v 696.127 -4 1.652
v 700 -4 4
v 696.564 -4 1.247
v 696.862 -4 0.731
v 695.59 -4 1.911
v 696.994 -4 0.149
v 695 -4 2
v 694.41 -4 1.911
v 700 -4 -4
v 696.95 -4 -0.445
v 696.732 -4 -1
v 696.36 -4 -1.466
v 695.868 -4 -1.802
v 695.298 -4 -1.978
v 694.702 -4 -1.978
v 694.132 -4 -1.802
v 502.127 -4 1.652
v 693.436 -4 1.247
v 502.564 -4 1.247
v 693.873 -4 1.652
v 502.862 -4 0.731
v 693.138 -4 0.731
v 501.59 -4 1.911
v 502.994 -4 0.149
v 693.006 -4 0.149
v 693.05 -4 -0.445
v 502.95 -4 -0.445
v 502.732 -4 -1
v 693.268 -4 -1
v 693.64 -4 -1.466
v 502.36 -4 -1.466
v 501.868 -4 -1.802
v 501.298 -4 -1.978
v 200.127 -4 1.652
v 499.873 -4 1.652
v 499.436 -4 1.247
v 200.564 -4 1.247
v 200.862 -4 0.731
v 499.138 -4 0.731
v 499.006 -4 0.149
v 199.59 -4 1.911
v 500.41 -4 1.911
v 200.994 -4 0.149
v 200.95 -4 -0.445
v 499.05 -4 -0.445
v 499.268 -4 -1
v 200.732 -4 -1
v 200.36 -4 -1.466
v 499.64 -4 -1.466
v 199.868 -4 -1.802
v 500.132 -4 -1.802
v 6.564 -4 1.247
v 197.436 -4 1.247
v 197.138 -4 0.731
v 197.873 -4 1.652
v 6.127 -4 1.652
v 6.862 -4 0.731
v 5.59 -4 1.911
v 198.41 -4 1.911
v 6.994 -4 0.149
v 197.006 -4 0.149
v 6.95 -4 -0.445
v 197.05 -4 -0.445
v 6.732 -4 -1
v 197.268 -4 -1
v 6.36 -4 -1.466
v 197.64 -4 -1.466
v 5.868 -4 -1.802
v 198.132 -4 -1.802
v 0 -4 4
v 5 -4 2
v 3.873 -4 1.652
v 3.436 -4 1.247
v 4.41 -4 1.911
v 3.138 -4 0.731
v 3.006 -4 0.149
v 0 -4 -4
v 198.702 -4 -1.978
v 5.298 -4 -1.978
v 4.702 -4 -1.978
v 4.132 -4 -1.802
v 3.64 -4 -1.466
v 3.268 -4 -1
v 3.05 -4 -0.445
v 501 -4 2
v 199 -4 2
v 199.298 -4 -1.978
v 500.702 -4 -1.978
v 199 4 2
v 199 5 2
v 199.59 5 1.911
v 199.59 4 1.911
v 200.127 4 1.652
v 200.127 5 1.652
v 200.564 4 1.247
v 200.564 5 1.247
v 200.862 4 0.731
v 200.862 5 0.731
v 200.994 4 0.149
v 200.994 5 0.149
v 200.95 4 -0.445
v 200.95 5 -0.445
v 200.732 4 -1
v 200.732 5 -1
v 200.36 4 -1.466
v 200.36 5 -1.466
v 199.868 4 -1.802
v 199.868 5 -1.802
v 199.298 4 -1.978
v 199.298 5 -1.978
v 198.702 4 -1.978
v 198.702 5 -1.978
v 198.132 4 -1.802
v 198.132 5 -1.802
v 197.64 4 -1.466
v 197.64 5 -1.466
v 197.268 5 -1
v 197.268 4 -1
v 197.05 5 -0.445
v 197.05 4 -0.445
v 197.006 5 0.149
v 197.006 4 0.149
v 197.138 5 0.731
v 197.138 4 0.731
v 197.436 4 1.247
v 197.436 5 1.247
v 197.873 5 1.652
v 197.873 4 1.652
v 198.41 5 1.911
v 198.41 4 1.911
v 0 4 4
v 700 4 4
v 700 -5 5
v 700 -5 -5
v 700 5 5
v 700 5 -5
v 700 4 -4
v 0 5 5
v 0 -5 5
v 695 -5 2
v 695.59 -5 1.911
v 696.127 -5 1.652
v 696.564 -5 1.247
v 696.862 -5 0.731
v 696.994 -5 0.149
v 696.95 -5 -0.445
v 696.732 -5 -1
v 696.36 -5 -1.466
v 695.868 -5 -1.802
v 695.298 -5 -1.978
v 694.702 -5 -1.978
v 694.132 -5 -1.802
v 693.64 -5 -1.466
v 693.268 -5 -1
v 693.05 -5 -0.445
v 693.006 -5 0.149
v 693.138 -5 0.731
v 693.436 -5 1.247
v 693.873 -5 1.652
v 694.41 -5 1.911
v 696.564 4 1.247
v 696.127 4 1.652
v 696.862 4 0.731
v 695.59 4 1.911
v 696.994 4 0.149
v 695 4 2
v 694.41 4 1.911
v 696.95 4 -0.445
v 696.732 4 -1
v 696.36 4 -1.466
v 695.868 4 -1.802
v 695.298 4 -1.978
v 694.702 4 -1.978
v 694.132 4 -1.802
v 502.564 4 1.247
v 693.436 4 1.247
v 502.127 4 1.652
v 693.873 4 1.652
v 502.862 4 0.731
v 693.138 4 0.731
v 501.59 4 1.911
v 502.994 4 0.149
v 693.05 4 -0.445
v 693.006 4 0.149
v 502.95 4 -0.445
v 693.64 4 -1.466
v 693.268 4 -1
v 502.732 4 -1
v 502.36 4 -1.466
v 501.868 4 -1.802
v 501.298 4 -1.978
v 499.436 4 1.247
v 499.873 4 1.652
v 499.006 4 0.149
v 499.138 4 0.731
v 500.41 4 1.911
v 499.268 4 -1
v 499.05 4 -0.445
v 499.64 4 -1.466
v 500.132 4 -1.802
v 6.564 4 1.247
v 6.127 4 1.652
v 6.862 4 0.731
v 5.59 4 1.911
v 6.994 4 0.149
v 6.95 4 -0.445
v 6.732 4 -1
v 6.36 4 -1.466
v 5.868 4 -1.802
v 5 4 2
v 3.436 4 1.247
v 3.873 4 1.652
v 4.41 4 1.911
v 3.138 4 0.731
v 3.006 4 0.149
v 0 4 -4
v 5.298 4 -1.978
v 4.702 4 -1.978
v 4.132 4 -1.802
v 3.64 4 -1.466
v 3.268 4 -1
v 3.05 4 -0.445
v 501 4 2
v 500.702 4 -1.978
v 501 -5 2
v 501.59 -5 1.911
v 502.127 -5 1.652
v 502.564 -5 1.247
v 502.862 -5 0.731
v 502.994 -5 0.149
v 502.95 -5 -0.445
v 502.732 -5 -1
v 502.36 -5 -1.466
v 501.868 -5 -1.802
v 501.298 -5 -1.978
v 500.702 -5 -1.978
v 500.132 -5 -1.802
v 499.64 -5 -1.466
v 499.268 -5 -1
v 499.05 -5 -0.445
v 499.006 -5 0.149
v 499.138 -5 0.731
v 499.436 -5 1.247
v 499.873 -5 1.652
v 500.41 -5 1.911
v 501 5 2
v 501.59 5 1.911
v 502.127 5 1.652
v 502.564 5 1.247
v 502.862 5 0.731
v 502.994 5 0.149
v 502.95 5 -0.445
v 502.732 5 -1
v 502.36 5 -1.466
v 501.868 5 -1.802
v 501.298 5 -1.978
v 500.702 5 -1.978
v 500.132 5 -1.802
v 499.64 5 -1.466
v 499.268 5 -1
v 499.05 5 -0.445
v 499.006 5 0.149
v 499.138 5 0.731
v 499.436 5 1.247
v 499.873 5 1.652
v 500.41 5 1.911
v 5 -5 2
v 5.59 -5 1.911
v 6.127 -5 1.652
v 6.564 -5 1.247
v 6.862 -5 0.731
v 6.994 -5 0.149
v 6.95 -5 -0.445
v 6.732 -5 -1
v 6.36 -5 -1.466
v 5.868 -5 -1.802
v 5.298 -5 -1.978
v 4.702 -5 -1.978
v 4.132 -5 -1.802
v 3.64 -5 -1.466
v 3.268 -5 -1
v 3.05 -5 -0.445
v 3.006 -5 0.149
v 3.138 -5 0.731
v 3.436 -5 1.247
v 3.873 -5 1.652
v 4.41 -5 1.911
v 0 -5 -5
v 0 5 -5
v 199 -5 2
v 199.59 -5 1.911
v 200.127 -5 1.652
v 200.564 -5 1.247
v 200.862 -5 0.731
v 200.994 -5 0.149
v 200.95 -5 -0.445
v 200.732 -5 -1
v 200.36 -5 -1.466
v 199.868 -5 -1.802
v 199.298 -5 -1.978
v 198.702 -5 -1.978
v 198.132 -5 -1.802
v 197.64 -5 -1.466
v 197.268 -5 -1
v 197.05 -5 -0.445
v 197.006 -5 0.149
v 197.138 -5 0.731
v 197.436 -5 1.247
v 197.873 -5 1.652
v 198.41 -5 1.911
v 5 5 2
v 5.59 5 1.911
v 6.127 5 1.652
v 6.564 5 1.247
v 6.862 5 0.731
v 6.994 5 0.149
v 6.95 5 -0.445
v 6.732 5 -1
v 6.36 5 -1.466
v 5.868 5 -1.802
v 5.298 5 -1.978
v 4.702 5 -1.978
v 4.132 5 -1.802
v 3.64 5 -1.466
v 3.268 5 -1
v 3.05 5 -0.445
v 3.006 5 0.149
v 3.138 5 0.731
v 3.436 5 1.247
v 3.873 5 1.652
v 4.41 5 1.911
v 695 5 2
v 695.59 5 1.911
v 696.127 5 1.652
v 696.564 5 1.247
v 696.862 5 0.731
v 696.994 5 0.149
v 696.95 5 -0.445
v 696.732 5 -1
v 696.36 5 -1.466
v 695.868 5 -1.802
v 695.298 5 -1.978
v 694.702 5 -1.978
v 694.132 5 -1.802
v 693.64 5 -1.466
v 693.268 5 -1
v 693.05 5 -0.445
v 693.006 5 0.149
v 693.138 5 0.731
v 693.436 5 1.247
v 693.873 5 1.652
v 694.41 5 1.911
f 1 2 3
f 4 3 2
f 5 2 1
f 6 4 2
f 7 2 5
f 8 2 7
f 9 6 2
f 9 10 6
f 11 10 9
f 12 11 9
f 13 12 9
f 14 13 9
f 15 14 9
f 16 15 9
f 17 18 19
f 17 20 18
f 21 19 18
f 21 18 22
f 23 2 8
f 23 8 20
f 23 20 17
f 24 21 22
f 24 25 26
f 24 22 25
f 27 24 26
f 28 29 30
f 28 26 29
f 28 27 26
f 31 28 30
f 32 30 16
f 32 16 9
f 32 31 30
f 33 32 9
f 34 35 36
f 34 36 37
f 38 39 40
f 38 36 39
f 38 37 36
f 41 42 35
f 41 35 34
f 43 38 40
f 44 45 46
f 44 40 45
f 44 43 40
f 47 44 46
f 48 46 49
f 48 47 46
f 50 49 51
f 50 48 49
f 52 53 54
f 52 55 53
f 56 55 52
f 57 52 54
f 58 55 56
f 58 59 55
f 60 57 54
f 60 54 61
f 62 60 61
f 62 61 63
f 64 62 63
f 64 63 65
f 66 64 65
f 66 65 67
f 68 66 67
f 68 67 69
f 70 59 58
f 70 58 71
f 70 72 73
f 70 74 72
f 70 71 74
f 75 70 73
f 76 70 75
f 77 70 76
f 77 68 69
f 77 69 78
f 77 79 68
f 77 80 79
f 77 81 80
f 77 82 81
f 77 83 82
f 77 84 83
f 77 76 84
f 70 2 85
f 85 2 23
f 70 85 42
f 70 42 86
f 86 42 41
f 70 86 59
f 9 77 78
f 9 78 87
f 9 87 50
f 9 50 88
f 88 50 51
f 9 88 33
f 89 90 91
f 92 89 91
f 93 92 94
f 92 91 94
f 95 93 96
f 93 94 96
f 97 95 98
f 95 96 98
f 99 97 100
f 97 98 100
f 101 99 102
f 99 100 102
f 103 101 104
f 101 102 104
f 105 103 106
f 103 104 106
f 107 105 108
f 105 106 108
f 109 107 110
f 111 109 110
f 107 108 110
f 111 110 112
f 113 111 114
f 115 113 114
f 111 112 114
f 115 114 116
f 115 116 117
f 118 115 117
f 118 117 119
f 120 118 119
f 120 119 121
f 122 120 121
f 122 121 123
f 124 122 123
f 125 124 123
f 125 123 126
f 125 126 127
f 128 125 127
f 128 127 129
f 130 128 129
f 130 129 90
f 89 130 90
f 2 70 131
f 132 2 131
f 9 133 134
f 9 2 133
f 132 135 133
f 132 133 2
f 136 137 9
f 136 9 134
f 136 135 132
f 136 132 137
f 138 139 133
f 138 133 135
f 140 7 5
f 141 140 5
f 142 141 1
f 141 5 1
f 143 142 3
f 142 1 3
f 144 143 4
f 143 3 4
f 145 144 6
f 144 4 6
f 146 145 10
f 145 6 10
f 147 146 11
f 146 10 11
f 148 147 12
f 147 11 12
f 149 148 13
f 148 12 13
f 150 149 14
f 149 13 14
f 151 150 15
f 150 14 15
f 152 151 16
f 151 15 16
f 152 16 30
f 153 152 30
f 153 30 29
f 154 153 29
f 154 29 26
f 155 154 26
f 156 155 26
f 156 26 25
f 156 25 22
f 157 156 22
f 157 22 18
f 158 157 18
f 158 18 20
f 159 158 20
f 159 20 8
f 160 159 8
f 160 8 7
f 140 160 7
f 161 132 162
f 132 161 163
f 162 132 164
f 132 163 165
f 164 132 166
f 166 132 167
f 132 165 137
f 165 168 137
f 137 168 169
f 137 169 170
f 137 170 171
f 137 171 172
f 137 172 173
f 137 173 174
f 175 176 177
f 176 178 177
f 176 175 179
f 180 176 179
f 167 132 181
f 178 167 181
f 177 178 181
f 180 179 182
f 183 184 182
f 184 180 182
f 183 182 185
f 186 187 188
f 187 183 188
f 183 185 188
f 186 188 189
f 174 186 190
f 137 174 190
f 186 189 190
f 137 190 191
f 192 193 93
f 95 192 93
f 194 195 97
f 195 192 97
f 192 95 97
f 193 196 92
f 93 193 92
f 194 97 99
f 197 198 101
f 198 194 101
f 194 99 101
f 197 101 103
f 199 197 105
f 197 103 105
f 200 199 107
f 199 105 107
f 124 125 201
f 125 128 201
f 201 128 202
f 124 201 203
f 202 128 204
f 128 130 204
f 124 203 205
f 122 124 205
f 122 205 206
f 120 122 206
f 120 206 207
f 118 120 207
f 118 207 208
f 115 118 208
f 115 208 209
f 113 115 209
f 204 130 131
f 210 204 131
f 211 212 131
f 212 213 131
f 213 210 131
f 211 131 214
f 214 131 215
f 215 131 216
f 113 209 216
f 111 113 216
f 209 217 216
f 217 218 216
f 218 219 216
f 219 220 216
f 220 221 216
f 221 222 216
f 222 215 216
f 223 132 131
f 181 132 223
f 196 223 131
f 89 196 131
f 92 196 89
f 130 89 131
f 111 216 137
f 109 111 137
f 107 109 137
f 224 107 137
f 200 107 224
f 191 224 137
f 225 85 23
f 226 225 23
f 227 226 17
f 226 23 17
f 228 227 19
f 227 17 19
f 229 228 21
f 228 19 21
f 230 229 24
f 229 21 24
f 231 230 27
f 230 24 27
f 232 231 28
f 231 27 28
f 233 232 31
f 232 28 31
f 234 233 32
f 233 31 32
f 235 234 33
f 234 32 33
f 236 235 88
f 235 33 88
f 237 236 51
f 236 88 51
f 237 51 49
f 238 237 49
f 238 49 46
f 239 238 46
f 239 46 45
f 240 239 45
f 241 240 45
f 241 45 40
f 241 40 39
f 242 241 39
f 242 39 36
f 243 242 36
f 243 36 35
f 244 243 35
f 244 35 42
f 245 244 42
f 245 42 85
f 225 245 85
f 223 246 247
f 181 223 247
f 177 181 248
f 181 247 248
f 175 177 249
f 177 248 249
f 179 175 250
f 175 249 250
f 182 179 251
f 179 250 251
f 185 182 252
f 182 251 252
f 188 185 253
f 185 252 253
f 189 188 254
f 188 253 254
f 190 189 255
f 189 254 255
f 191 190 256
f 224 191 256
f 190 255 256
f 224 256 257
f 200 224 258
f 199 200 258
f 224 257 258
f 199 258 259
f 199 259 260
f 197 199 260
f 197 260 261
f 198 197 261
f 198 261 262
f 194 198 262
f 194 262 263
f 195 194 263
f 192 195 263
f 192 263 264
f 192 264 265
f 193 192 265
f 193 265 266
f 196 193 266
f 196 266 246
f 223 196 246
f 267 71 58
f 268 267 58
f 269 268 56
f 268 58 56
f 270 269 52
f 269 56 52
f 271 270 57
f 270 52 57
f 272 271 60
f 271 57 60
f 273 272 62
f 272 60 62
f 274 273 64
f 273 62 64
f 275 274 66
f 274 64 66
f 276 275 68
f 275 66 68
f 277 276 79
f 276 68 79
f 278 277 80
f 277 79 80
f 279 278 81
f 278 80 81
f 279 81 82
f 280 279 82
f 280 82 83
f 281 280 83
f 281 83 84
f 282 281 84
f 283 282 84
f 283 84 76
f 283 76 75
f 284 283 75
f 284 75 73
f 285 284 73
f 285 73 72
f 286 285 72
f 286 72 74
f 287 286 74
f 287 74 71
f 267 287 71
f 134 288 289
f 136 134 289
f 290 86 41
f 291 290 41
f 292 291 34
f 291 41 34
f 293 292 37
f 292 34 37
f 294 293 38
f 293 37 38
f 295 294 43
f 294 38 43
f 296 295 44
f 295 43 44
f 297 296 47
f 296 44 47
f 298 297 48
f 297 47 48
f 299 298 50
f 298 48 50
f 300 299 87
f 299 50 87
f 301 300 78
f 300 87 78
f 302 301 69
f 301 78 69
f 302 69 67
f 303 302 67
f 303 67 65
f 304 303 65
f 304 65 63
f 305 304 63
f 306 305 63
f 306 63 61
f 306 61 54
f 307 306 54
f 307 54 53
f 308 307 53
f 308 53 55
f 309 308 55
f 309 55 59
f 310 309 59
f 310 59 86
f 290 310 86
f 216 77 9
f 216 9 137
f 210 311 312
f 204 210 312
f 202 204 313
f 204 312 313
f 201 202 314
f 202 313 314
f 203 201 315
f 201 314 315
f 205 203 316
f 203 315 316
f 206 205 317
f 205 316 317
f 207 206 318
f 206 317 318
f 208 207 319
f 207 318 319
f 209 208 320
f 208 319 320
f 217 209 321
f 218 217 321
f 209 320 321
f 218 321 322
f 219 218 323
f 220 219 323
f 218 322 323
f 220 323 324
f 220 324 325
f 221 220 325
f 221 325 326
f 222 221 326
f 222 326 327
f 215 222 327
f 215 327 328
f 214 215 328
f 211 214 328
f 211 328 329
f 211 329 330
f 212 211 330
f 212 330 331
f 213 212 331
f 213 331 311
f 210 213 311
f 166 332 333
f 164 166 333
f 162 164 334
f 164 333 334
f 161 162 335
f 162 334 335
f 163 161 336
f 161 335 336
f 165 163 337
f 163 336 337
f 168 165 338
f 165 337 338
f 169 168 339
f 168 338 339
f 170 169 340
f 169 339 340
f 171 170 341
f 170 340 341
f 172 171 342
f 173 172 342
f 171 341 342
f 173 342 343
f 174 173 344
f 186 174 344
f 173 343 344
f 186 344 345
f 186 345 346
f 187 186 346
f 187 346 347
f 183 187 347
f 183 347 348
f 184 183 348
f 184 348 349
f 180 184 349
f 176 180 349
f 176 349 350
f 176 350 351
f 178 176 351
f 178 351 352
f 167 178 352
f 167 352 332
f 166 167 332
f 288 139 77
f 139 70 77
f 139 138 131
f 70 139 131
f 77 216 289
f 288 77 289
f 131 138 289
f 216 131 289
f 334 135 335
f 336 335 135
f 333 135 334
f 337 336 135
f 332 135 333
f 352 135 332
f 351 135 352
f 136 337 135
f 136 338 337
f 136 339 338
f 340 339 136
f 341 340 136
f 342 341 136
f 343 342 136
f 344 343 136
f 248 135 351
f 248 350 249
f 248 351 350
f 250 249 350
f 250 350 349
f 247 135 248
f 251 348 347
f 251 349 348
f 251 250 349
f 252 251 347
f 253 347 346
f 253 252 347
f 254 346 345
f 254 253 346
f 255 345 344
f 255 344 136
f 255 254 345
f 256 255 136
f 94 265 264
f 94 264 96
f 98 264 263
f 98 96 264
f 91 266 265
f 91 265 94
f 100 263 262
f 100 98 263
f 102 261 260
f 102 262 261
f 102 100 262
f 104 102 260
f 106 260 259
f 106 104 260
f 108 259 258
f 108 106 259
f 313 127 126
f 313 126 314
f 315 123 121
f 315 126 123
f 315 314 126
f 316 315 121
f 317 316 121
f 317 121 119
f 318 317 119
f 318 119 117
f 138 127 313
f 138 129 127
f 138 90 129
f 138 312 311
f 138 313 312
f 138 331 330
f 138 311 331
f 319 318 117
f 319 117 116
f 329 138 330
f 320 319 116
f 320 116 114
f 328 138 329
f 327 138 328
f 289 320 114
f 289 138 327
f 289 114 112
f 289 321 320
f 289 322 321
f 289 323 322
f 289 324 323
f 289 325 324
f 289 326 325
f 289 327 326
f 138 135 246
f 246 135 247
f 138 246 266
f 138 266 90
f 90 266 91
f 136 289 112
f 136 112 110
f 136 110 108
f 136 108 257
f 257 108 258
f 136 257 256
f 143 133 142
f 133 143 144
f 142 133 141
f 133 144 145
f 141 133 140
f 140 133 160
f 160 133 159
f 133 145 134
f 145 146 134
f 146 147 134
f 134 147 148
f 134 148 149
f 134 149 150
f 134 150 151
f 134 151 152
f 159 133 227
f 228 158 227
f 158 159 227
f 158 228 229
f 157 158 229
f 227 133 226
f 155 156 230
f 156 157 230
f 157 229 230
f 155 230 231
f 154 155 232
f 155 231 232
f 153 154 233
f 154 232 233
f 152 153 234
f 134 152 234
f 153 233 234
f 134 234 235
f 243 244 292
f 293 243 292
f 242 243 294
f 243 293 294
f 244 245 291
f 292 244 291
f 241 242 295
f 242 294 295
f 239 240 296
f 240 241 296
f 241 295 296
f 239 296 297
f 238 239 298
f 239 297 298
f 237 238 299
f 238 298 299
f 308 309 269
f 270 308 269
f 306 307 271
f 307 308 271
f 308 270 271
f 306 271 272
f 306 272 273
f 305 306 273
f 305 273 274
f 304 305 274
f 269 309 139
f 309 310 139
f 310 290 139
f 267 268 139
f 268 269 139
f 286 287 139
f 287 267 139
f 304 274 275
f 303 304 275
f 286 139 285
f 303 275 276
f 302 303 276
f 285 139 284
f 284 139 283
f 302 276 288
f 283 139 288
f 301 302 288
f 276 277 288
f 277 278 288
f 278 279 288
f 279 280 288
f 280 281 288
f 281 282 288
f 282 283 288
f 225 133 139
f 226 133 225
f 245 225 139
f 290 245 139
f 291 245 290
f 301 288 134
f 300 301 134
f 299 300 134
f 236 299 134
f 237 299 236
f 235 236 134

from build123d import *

# Parameters (mm, degrees)
SKETCH_1_W          = 10
SKETCH_1_H          = 10
SKETCH_1_W_2        = 8
SKETCH_1_H_2        = 8
EXTRUDE_1_DEPTH     = 700
SKETCH_2_R          = 2
CUT_EXTRUDE_1_DEPTH = 701.089280021


with BuildPart() as part:
    # ｽｹｯﾁ1 → 押し出し-薄板1 (new body)
    with BuildSketch(Plane(origin=(0, 0, 0), x_dir=(0, 0, -1), z_dir=(1, 0, 0))):
        Rectangle(SKETCH_1_W, SKETCH_1_H)
        Rectangle(SKETCH_1_W_2, SKETCH_1_H_2, mode=Mode.SUBTRACT)
    extrude(amount=EXTRUDE_1_DEPTH)

    # ｽｹｯﾁ2 → ｶｯﾄ - 押し出し1 (cut, through all)
    with BuildSketch(Plane(origin=(0, 5, 0), x_dir=(1, 0, 0), z_dir=(0, 1, 0))):
        with Locations(Location((695, 0, 0), (0, 0, 270))):
            Circle(SKETCH_2_R)
        with Locations(Location((5, 0, 0), (0, 0, 270))):
            Circle(SKETCH_2_R)
        with Locations(Location((501, 0, 0), (0, 0, 270))):
            Circle(SKETCH_2_R)
        with Locations(Location((199, 0, 0), (0, 0, 270))):
            Circle(SKETCH_2_R)
    extrude(amount=-CUT_EXTRUDE_1_DEPTH, mode=Mode.SUBTRACT)


solid = part.part
